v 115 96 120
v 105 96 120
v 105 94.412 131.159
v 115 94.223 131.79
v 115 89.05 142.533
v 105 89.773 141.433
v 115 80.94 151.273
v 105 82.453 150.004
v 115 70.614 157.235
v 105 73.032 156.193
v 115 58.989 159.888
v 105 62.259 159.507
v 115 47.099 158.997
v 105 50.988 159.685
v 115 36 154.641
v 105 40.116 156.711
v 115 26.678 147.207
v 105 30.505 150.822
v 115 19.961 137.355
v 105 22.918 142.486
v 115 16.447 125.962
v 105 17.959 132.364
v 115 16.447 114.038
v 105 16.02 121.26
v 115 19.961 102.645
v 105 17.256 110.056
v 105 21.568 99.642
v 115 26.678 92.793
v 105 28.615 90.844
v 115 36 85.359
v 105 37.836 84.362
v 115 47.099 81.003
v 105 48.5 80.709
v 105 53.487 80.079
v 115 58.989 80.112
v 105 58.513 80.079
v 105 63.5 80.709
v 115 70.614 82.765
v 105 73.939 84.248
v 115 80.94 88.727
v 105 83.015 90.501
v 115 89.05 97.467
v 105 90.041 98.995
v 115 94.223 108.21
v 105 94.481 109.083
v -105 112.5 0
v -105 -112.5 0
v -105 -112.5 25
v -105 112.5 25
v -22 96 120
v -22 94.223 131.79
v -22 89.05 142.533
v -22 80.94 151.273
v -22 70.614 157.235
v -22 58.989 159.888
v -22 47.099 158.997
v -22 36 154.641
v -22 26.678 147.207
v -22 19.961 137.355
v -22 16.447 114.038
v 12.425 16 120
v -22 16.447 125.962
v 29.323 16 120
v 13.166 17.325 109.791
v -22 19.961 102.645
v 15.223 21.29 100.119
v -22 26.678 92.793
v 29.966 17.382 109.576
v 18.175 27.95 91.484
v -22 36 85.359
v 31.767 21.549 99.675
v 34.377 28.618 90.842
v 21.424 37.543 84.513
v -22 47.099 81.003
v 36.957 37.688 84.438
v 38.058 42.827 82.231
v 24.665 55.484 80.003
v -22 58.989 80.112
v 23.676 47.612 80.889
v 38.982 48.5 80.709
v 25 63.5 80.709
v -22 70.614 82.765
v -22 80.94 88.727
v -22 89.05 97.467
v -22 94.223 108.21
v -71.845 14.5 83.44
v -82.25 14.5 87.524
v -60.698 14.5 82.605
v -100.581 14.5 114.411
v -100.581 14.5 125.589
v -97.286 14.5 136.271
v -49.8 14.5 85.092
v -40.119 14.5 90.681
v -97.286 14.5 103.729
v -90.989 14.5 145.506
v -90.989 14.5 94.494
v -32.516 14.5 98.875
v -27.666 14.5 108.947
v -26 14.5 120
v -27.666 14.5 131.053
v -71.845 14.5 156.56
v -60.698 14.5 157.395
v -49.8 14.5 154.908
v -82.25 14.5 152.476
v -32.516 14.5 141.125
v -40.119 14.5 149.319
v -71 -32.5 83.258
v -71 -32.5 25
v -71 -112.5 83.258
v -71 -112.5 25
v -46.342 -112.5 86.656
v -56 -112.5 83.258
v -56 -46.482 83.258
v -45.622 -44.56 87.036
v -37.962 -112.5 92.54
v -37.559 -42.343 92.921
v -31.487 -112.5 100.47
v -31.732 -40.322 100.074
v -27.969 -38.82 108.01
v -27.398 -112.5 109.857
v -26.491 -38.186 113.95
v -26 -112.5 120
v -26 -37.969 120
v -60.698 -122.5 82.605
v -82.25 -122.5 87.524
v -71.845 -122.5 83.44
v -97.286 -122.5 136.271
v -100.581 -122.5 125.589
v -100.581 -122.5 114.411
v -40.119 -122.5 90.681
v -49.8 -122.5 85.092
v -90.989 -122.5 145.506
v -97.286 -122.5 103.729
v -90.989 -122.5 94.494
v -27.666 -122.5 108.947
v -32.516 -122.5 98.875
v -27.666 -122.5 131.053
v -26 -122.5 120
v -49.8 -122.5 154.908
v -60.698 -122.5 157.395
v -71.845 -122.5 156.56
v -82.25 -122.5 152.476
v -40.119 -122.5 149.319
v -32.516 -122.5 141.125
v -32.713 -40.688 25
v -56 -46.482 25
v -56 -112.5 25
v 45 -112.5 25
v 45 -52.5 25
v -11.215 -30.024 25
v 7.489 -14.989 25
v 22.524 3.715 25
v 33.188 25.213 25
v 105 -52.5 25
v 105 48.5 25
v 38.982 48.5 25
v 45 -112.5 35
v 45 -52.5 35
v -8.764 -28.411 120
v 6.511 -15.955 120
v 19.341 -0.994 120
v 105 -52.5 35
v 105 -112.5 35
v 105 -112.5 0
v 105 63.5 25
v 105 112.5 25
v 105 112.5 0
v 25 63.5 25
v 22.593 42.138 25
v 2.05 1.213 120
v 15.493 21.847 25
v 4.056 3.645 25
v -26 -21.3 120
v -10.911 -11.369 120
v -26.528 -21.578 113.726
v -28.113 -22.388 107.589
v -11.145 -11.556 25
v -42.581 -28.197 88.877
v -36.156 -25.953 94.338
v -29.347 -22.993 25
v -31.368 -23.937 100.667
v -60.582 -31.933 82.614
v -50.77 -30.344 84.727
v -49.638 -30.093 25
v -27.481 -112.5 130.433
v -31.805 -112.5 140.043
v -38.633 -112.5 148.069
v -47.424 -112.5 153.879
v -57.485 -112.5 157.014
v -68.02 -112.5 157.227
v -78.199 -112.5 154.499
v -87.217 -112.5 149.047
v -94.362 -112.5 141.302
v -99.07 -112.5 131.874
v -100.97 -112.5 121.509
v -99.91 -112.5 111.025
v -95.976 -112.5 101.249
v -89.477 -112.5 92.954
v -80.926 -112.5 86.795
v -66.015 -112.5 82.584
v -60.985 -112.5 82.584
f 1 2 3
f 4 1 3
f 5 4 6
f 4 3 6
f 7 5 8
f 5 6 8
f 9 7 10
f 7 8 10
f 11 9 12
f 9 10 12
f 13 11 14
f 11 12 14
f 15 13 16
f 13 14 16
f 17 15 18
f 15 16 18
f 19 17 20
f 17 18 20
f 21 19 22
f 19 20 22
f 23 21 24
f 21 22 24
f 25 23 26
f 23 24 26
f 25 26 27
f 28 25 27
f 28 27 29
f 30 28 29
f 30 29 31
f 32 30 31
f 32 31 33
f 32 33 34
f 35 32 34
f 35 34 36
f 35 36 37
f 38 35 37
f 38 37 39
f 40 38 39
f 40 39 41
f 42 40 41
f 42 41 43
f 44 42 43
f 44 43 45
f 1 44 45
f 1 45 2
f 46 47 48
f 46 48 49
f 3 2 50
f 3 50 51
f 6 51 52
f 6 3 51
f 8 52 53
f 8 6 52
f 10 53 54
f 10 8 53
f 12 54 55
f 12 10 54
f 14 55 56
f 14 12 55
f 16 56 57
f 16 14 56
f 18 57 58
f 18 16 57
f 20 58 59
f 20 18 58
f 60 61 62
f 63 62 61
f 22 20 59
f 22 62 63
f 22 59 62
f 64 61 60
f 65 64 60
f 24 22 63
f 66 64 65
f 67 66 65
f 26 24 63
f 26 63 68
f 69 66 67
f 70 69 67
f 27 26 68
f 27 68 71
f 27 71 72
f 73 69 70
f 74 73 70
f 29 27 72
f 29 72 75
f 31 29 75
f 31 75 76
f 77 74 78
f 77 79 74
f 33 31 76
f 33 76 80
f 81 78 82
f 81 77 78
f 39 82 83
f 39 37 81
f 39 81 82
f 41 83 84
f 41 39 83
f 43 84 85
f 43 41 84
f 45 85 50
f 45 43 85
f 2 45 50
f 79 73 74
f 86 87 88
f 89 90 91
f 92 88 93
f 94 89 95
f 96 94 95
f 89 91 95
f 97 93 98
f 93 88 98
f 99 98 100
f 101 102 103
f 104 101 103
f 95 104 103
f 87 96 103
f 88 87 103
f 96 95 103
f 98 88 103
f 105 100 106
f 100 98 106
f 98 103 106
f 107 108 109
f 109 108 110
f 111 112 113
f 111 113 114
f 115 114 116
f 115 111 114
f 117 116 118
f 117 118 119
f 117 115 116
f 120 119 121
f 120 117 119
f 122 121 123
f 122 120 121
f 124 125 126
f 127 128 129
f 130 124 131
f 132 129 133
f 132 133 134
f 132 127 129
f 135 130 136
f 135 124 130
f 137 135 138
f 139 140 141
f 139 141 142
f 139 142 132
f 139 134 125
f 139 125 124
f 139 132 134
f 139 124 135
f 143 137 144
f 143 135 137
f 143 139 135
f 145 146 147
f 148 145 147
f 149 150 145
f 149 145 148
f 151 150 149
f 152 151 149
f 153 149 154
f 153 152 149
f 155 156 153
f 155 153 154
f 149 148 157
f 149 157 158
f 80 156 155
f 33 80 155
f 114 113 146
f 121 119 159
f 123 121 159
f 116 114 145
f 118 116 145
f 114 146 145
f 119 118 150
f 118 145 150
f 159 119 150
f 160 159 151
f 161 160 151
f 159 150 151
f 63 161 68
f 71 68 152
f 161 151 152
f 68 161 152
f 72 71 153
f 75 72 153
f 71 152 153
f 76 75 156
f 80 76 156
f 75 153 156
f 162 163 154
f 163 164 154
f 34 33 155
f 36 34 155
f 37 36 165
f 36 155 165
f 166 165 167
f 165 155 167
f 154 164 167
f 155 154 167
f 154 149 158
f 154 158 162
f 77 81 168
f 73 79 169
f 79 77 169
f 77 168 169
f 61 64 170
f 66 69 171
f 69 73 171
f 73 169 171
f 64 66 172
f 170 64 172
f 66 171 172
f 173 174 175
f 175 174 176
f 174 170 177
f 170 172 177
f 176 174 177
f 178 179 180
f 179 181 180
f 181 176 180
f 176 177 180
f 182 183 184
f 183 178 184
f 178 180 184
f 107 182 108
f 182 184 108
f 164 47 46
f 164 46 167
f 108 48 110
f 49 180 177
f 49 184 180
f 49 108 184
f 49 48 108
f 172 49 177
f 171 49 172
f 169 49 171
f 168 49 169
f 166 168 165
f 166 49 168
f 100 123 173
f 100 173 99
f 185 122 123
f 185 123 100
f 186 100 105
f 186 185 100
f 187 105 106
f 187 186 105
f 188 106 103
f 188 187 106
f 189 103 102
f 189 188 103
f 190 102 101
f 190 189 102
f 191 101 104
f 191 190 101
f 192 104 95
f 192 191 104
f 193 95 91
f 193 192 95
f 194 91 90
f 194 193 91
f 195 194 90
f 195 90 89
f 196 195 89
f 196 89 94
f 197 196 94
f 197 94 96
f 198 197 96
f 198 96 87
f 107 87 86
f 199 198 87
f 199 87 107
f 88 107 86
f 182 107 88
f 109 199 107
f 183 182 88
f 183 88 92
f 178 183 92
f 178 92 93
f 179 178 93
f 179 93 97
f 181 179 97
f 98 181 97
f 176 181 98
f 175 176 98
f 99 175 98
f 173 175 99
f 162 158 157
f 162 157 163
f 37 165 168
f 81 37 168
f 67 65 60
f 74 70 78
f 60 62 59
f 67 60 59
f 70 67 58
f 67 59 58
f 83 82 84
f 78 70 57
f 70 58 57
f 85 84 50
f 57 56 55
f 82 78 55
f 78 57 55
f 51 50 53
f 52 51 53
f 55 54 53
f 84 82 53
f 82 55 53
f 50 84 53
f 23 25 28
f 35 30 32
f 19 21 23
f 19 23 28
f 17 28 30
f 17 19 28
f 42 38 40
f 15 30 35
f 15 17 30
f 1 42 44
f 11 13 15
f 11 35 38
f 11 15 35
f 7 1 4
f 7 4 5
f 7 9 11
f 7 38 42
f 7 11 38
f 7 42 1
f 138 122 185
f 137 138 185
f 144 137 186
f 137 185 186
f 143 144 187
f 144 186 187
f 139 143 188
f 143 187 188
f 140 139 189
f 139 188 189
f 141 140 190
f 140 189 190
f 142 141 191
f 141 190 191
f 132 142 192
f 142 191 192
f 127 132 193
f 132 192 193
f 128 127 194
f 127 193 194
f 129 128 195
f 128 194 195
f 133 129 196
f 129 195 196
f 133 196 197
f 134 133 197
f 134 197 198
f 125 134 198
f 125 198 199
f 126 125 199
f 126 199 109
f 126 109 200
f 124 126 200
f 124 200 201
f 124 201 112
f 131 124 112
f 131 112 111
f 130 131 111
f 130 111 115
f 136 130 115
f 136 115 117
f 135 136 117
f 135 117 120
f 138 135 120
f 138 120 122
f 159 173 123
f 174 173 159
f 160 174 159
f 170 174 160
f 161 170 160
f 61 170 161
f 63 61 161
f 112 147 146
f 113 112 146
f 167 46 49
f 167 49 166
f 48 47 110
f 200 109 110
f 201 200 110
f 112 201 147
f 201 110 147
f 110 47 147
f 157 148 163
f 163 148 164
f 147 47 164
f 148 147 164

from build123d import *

# Parameters (mm, degrees)
F0_W          = 210
F0_H          = 225
F1_DEPTH      = 25
F3_DEPTH      = 95
F4_R          = 37.5
F5_DEPTH      = 10
F5_DEPTH_BACK = 127
F6_R          = 40
F7_DEPTH      = 10
F7_DEPTH_BACK = 127
F8_W          = 60
F8_H          = 60
F9_DEPTH      = 10


with BuildPart() as f1:
    # F0 (on Top) → F1 (new body)
    with BuildSketch(Plane.XY):
        Rectangle(F0_W, F0_H)
    extrude(amount=F1_DEPTH)

    # F2 (on face) → F3 (join)
    with BuildSketch(Plane.XY.offset(25)):
        with BuildLine():
            Line((-71, -32.5), (-71, -112.5))
            Line((-71, -112.5), (-56, -112.5))
            Line((-56, -112.5), (-56, -46.481817))
            ThreePointArc((-56, -46.481817), (7.488853, -14.988853), (38.981817, 48.5))
            Line((38.981817, 48.5), (105, 48.5))
            Line((105, 48.5), (105, 63.5))
            Line((105, 63.5), (25, 63.5))
            ThreePointArc((25, 63.5), (-3.117749, -4.382251), (-71, -32.5))
        make_face()
    extrude(amount=F3_DEPTH)

    # F4 (on face) → F5 (join, two sides)
    with BuildSketch(Plane.XZ.offset(112.5)) as f5_sk:
        with Locations((-63.5, 120)):
            Circle(F4_R)
    extrude(amount=F5_DEPTH)
    extrude(f5_sk.sketch, amount=-F5_DEPTH_BACK)

    # F6 (on face) → F7 (join, two sides)
    with BuildSketch(Plane.YZ.offset(105)) as f7_sk:
        with Locations((56, 120)):
            Circle(F6_R)
    extrude(amount=F7_DEPTH)
    extrude(f7_sk.sketch, amount=-F7_DEPTH_BACK)

    # F8 (on face) → F9 (join)
    with BuildSketch(Plane.XY.offset(25)):
        with Locations((75, -82.5)):
            Rectangle(F8_W, F8_H)
    extrude(amount=F9_DEPTH)


solid = f1.part
